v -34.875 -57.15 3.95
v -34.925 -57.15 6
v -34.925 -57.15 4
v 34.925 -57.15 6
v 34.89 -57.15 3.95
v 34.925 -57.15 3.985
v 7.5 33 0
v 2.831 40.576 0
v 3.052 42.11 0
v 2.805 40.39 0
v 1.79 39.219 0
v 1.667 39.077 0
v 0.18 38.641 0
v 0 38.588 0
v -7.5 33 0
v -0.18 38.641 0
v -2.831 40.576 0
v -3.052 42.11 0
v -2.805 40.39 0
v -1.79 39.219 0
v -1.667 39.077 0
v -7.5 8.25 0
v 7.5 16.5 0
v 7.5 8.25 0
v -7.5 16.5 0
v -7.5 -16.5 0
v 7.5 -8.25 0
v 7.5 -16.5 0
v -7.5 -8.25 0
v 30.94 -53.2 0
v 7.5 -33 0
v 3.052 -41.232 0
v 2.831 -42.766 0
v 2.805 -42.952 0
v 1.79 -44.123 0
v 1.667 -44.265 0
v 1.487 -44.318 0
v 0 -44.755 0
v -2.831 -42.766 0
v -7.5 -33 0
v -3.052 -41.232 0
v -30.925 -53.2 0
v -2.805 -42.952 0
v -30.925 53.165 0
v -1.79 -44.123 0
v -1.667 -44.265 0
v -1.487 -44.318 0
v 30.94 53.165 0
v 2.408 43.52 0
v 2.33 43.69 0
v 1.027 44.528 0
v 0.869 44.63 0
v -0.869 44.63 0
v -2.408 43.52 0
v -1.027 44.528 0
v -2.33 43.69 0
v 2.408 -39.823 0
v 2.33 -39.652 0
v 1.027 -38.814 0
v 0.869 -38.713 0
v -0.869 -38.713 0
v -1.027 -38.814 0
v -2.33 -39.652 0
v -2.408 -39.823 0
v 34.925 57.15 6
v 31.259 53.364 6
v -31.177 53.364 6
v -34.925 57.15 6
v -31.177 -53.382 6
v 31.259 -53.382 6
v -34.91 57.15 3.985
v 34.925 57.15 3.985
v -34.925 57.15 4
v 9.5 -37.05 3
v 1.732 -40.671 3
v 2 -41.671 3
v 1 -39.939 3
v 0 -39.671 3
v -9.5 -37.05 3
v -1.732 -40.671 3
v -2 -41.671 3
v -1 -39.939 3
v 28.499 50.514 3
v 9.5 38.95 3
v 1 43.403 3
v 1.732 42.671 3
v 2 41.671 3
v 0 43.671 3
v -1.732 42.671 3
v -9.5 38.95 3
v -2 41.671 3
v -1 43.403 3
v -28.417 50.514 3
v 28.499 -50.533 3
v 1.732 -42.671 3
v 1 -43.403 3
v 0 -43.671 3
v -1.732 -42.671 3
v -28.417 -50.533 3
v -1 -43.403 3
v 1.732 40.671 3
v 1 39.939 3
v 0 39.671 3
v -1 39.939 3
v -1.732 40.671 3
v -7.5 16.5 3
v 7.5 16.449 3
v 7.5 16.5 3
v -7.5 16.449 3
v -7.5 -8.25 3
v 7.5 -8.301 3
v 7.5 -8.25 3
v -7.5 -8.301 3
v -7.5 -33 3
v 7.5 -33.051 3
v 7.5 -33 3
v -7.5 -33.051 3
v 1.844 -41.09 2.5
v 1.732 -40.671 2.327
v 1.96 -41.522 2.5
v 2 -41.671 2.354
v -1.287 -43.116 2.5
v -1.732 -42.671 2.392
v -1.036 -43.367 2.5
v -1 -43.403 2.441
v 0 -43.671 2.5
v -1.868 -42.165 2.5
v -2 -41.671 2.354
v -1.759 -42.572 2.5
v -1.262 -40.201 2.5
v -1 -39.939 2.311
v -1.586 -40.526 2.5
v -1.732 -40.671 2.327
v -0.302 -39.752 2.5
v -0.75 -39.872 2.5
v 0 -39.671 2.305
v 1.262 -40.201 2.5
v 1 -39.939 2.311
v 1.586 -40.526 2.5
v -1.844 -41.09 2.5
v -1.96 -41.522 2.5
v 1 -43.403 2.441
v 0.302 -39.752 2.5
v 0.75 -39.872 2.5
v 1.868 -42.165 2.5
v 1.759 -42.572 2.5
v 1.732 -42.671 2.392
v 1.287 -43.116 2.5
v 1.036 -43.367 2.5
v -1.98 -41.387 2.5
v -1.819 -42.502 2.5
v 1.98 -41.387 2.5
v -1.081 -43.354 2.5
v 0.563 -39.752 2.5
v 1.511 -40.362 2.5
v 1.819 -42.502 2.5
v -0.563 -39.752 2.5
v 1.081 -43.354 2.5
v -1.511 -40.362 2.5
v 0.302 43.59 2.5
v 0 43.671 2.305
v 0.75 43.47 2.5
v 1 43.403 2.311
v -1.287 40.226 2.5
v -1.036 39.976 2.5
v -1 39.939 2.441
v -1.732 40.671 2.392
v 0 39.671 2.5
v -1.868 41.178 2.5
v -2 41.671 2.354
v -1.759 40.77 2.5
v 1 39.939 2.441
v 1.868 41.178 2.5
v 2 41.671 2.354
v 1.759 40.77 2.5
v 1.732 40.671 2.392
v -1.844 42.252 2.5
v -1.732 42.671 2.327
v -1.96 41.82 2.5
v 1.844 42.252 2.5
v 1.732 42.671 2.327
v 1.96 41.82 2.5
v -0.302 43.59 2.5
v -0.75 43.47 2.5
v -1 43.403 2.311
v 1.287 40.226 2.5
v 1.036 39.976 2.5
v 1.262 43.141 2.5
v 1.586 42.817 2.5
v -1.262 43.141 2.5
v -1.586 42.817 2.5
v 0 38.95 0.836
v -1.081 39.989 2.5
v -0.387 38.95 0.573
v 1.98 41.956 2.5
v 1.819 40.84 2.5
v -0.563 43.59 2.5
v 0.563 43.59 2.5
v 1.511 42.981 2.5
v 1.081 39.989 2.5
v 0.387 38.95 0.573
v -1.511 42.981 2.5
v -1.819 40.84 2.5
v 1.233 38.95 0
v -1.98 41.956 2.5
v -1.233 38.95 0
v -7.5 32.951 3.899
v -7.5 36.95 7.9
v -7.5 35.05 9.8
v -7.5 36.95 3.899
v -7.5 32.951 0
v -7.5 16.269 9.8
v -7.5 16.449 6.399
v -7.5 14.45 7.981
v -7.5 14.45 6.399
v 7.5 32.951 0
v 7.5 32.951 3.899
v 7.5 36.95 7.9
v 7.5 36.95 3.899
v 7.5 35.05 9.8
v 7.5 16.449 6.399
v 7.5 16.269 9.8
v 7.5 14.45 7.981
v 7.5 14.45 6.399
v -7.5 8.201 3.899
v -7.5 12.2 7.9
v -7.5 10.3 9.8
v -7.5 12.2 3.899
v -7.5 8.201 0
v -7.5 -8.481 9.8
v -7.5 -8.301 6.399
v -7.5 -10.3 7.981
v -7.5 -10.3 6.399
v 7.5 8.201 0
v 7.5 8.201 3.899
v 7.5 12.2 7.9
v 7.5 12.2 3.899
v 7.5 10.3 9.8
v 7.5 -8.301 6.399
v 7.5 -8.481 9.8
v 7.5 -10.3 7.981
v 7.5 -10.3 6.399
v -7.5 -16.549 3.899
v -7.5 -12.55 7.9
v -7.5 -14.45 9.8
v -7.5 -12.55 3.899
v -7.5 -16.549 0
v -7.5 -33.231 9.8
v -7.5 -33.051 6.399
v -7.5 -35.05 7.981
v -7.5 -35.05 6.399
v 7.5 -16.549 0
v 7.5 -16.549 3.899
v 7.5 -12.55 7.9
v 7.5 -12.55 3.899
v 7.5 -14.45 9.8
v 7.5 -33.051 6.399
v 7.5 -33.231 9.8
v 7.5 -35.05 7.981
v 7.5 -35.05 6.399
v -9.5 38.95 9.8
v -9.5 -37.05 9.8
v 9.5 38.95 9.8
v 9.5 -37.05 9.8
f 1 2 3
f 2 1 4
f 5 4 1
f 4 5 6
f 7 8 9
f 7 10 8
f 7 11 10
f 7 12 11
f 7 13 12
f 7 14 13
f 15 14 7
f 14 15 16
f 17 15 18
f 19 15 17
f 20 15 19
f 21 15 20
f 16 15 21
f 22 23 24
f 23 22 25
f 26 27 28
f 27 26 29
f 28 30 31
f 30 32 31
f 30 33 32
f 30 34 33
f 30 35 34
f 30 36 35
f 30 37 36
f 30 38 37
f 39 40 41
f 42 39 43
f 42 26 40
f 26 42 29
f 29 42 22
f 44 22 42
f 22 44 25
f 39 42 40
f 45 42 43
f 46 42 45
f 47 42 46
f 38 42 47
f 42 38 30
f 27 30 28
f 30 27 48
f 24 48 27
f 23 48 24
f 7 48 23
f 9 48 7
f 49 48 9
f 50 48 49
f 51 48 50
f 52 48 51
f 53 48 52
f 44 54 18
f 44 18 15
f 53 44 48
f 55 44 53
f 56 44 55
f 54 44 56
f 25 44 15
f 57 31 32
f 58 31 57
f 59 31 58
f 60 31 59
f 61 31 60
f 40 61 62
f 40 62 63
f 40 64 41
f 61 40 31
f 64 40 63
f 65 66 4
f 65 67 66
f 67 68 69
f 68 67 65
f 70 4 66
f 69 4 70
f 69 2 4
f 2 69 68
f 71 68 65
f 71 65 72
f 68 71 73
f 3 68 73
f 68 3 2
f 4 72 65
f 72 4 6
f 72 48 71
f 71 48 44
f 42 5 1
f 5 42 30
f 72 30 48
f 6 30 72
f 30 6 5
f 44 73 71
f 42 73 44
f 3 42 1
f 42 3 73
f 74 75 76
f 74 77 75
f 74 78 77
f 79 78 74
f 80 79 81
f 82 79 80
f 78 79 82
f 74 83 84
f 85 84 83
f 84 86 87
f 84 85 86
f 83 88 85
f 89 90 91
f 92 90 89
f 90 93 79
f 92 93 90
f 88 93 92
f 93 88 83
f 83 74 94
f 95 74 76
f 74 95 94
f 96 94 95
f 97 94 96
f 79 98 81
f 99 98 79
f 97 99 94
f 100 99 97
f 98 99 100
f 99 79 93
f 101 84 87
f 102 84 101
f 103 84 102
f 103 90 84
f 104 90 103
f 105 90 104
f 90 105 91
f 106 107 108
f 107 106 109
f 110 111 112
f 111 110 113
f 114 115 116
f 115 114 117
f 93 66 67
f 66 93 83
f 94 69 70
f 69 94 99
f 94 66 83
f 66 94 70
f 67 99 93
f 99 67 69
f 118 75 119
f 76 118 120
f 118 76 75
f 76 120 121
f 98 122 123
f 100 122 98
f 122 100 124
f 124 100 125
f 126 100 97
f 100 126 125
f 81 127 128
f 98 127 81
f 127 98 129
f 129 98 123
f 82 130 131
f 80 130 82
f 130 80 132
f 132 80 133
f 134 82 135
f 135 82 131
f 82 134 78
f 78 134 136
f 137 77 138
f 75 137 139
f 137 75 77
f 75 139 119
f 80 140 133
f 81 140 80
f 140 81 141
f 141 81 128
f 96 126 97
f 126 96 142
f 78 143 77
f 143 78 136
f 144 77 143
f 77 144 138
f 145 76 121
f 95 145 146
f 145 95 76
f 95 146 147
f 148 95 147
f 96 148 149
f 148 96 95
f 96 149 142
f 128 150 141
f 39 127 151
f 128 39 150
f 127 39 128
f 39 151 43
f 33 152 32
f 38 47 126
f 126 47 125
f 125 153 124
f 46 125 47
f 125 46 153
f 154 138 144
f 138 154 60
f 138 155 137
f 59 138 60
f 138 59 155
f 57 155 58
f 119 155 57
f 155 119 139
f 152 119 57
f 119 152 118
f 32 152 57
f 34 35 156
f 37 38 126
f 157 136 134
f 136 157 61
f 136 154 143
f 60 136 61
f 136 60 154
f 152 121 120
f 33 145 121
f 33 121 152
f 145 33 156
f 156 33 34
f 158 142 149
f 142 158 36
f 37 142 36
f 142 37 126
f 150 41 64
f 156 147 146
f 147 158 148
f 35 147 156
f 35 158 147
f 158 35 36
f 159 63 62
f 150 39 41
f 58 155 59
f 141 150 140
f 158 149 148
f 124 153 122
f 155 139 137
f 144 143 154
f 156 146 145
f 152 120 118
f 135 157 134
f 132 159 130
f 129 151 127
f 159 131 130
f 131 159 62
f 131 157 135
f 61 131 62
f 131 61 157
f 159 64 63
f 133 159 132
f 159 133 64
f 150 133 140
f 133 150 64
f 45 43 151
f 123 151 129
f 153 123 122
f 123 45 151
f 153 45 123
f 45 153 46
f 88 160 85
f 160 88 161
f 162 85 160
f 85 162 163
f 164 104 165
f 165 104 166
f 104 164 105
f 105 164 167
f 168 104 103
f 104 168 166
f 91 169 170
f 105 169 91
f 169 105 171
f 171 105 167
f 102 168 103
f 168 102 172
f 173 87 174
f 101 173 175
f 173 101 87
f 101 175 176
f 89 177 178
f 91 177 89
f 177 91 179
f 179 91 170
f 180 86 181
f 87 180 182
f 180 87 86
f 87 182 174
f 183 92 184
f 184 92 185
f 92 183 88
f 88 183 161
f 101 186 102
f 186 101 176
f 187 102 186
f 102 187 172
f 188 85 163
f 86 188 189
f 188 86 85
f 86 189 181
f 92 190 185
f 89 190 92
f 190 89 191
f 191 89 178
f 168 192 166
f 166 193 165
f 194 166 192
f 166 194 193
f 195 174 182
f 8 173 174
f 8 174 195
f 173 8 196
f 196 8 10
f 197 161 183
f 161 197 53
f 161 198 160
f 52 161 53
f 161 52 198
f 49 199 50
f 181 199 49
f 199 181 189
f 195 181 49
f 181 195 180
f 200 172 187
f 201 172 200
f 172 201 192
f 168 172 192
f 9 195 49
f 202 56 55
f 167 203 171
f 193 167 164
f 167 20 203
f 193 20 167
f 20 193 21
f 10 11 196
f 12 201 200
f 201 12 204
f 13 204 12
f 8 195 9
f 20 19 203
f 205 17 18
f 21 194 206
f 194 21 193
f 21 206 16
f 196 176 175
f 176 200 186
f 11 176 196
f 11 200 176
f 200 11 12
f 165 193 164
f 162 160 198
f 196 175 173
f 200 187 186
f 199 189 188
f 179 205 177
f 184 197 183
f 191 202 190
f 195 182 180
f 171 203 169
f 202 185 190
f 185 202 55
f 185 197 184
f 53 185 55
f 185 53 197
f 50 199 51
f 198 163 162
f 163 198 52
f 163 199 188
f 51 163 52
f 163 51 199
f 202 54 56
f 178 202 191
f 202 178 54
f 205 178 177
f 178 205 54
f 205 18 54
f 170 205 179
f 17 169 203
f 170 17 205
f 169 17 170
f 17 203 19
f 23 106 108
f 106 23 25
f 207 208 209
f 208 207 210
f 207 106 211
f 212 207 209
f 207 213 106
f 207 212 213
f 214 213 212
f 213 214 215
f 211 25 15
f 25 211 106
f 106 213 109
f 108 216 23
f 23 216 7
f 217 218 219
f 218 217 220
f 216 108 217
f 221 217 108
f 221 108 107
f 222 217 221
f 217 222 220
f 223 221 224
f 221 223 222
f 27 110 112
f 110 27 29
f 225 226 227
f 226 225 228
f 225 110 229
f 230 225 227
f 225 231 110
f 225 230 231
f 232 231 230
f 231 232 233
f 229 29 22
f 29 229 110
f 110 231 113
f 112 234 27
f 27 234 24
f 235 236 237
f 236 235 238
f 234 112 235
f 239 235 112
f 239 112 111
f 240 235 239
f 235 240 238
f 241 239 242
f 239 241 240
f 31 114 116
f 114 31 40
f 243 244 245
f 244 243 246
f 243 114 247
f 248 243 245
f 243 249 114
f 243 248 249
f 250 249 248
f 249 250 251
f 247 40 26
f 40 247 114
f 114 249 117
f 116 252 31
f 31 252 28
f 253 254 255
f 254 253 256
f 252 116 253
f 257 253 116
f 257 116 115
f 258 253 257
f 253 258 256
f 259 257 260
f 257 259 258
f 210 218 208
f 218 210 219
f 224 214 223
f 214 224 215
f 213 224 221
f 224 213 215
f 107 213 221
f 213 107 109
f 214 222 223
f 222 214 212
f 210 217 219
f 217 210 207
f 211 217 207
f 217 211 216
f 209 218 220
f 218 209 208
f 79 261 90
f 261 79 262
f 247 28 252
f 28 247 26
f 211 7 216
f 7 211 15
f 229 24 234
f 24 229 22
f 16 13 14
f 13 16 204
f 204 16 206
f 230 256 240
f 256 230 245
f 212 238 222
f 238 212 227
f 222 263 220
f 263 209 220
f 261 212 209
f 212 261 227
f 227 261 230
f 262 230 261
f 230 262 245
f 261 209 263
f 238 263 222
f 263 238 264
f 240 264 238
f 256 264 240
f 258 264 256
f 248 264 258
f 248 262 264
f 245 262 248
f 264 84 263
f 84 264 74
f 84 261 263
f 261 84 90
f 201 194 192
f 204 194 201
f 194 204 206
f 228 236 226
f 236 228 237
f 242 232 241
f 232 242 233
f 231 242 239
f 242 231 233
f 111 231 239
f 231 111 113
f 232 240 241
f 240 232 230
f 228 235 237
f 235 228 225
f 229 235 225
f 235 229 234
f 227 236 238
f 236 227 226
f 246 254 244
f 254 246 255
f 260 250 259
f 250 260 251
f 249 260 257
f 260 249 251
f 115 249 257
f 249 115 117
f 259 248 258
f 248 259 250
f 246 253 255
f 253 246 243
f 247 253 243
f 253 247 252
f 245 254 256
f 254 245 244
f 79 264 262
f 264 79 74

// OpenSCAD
// WALLY - Wall Plate Customizer v1.4
// by TheNewHobbyist 2013 (http://thenewhobbyist.com)
// http://www.thingiverse.com/thing:47956
//
// Most of the connectors used with this thing are panel mount connectors from
// www.DataPro.net I can't vouch for their quality but they did have easy to
// find dimensions for their products so I used them.
//
// This could be tightened up considerably but I thought I'd get it out there for people
// to experiment with before I lose my mind staring at it too long. Also this is my
// first OpenSCAD model so cut me some slack ;)
//
//   Notes:
//
// * The plug types "Duplex Outlet", "Long_Toggle Switch", "Toggle Switch", and "Rocker"
//   will all use the entire plate when selected in top or bottom configuration. The
//   other selection (if not "none" will be selected.
//
// * "None" and "Blank should not be considered equal. if "None" is selected for one of
//   the two holes on a plate the other selection will be centered on that plate. If
//   "Blank" is selected that plug location will remain blank but the other selection
//   will NOT move into a centered position.
//
//	Change Log:
//
//	v1.1
//	UPDATED: Screw hole locations for designer and toggle plate types.
//	UPDATED: Hole size for designer plate type.
//	UPDATED: Outlet hole spacing
//
//	v1.2
//	ADDED: Long Toggle Switch for laird
//
//	v1.3
//	ADDED: 3 new sizes for plate export: Standard, Junior-Jumbo, and Jumbo.
//
//	v1.3a
//	ADDED: Keystone jack pair
//
//	v1.3b
//	ADDED: whole-plate 2x3 array of Keystone jacks
//
//  v1.4 by rssalerno
//  ADDED: 1x3 array of Keystone jacks
//  FIXED: bugs in plates 4 and 5

  //////////////////////////
 // Customizer Settings: //
//////////////////////////

//How big are we talkin' here?
plate_width = 1; //	[1:5]

// Bigger hole in your wall? Try this
plate_size = 0; // [0:Standard, 1:Junior-Jumbo, 2:Jumbo]

//Pick a plug or full plate type
1st_plate = "keystone3";  //	["none":None, "blank":Blank Port, "toggle":Full Plate - Toggle Switch, "long_toggle":Full Plate - Long Toggle Switch, "outlet":Full Plate - Duplex Outlet, "rocker":Full Plate - Rocker/Designer Plate, "keystone1":Keystone Jack, "keystone2":Keystone Jack Pair, "keystone3":1x3 Keystone Jack array, "keystone6":2x3 Keystone Jack array, "vga":VGA Port, "hdmi":HDMI Port, "dvi":DVI-I Port, "displayport":Displayport, "cat5e":Cat5e/Cat6 Port, "usb-a":USB-A Port, "usb-b":USB-B Port, "firewire":Firewire IEEE 1394 Port, "db09":DB-09 Port, "ps2":PS2 Port, "f-type": F-Type/Coaxial Port,"svideo":S-Video Port, "stereo":Stereo Headphone Jack]
//Pick a bottom plug type or leave as none
1st_plate_bottom_hole = "none";  //	["none":None, "blank":Blank Port, "keystone1":Keystone Jack, "keystone2":Keystone Jack Pair, "vga":VGA Port, "hdmi":HDMI Port, "dvi":DVI-I Port, "displayport":Displayport, "cat5e":Cat5e/Cat6 Port, "usb-a":USB-A Port, "usb-b":USB-B Port, "firewire":Firewire IEEE 1394 Port, "db09":DB-09 Port, "ps2":PS2 Port, "f-type": F-Type/Coaxial Port,"svideo":S-Video Port, "stereo":Stereo Headphone Jack]
//Pick a plug or full plate type
2nd_plate = "none";  //	["none":None, "blank":Blank Port, "toggle":Full Plate - Toggle Switch, "long_toggle":Full Plate - Long Toggle Switch, "outlet":Full Plate - Duplex Outlet, "rocker":Full Plate - Rocker/Designer Plate, "keystone1":Keystone Jack, "keystone2":Keystone Jack Pair, "keystone3":1x3 Keystone Jack array, "keystone6":2x3 Keystone Jack array, "vga":VGA Port, "hdmi":HDMI Port, "dvi":DVI-I Port, "displayport":Displayport, "cat5e":Cat5e/Cat6 Port, "usb-a":USB-A Port, "usb-b":USB-B Port, "firewire":Firewire IEEE 1394 Port, "db09":DB-09 Port, "ps2":PS2 Port, "f-type": F-Type/Coaxial Port,"svideo":S-Video Port, "stereo":Stereo Headphone Jack]
//Pick a bottom plug type or leave as none
2nd_plate_bottom_hole = "none";  //	["none":None, "blank":Blank Port, "keystone1":Keystone Jack, "keystone2":Keystone Jack Pair, "vga":VGA Port, "hdmi":HDMI Port, "dvi":DVI-I Port, "displayport":Displayport, "cat5e":Cat5e/Cat6 Port, "usb-a":USB-A Port, "usb-b":USB-B Port, "firewire":Firewire IEEE 1394 Port, "db09":DB-09 Port, "ps2":PS2 Port, "f-type": F-Type/Coaxial Port,"svideo":S-Video Port, "stereo":Stereo Headphone Jack]
//Pick a plug or full plate type
3rd_plate = "none";  //	["none":None, "blank":Blank Port, "toggle":Full Plate - Toggle Switch, "long_toggle":Full Plate - Long Toggle Switch, "outlet":Full Plate - Duplex Outlet, "rocker":Full Plate - Rocker/Designer Plate, "keystone1":Keystone Jack, "keystone2":Keystone Jack Pair, "keystone3":1x3 Keystone Jack array, "keystone6":2x3 Keystone Jack array, "vga":VGA Port, "hdmi":HDMI Port, "dvi":DVI-I Port, "displayport":Displayport, "cat5e":Cat5e/Cat6 Port, "usb-a":USB-A Port, "usb-b":USB-B Port, "firewire":Firewire IEEE 1394 Port, "db09":DB-09 Port, "ps2":PS2 Port, "f-type": F-Type/Coaxial Port,"svideo":S-Video Port, "stereo":Stereo Headphone Jack]
//Pick a bottom plug type or leave as none
3rd_plate_bottom_hole = "none";  //	["none":None, "blank":Blank Port, "keystone1":Keystone Jack, "keystone2":Keystone Jack Pair, "vga":VGA Port, "hdmi":HDMI Port, "dvi":DVI-I Port, "displayport":Displayport, "cat5e":Cat5e/Cat6 Port, "usb-a":USB-A Port, "usb-b":USB-B Port, "firewire":Firewire IEEE 1394 Port, "db09":DB-09 Port, "ps2":PS2 Port, "f-type": F-Type/Coaxial Port,"svideo":S-Video Port, "stereo":Stereo Headphone Jack]
//Pick a plug or full plate type
4th_plate = "none";  //["none":None, "blank":Blank Port, "toggle":Full Plate - Toggle Switch, "long_toggle":Full Plate - Long Toggle Switch, "outlet":Full Plate - Duplex Outlet, "rocker":Full Plate - Rocker/Designer Plate, "keystone1":Keystone Jack, "keystone2":Keystone Jack Pair, "keystone3":1x3 Keystone Jack array, "keystone6":2x3 Keystone Jack array, "vga":VGA Port, "hdmi":HDMI Port, "dvi":DVI-I Port, "displayport":Displayport, "cat5e":Cat5e/Cat6 Port, "usb-a":USB-A Port, "usb-b":USB-B Port, "firewire":Firewire IEEE 1394 Port, "db09":DB-09 Port, "ps2":PS2 Port, "f-type": F-Type/Coaxial Port,"svideo":S-Video Port, "stereo":Stereo Headphone Jack]
//Pick a bottom plug type or leave as none
4th_plate_bottom_hole = "none";  //	["none":None, "blank":Blank Port, "keystone1":Keystone Jack, "keystone2":Keystone Jack Pair, "vga":VGA Port, "hdmi":HDMI Port, "dvi":DVI-I Port, "displayport":Displayport, "cat5e":Cat5e/Cat6 Port, "usb-a":USB-A Port, "usb-b":USB-B Port, "firewire":Firewire IEEE 1394 Port, "db09":DB-09 Port, "ps2":PS2 Port, "f-type": F-Type/Coaxial Port,"svideo":S-Video Port, "stereo":Stereo Headphone Jack]
//Pick a plug or full plate type
5th_plate = "none";  //["none":None, "blank":Blank Port, "toggle":Full Plate - Toggle Switch, "long_toggle":Full Plate - Long Toggle Switch, "outlet":Full Plate - Duplex Outlet, "rocker":Full Plate - Rocker/Designer Plate, "keystone1":Keystone Jack, "keystone2":Keystone Jack Pair, "keystone3":1x3 Keystone Jack array, "keystone6":2x3 Keystone Jack array, "vga":VGA Port, "hdmi":HDMI Port, "dvi":DVI-I Port, "displayport":Displayport, "cat5e":Cat5e/Cat6 Port, "usb-a":USB-A Port, "usb-b":USB-B Port, "firewire":Firewire IEEE 1394 Port, "db09":DB-09 Port, "ps2":PS2 Port, "f-type": F-Type/Coaxial Port,"svideo":S-Video Port, "stereo":Stereo Headphone Jack]
//Pick a bottom plug type or leave as none
5th_plate_bottom_hole = "none";  //	["none":None, "blank":Blank Port, "keystone1":Keystone Jack, "keystone2":Keystone Jack Pair, "vga":VGA Port, "hdmi":HDMI Port, "dvi":DVI-I Port, "displayport":Displayport, "cat5e":Cat5e/Cat6 Port, "usb-a":USB-A Port, "usb-b":USB-B Port, "firewire":Firewire IEEE 1394 Port, "db09":DB-09 Port, "ps2":PS2 Port, "f-type": F-Type/Coaxial Port,"svideo":S-Video Port, "stereo":Stereo Headphone Jack]

  //////////////////////
 // Static Settings: //
//////////////////////

module GoAwayCustomizer() {
// This module is here to stop Customizer from picking up the variables below
}

l_offset = [34.925,39.6875,44.45];
r_offset = [34.925,39.6875,44.45];
spacer = [0,0,46.0375,92.075,138.1125,184.15];
solid_plate_width = l_offset[plate_size] + spacer[plate_width] + r_offset[plate_size];

height_sizes = [114.3,123.825,133.35];

height = 114.3; //plate height (static)
gang_width=[0,69.86,115.824,161.925,206.375,254]; // Plate widths (standard)

edgewidth = solid_plate_width + 10; // Bevel setting for top and bottom
rightbevel = solid_plate_width - 4; // Bevel for right side (scales)

left_offset = 34.925; // Offset first hole position
switch_offset = 46.0375; // Offset all additional holes
thinner_offset=[0,0.92,0.95,0.96,0.97,0.973]; // Manual fix for right side wackiness

positions=[height_sizes[plate_size]/2,height_sizes[plate_size]/2 - 14.25,height_sizes[plate_size]/2 + 14.25];

// preview[view:north, tilt:bottom]

  ///////////////////
 // Hole Control: //
///////////////////

module plate1(){
	if (1st_plate == "toggle" || 1st_plate_bottom_hole == "toggle"){
		translate([0,l_offset[plate_size],0]) toggle_screws();
		translate([0,l_offset[plate_size],0]) hole("toggle");
		}
	else if (1st_plate == "long_toggle" || 1st_plate_bottom_hole == "long_toggle"){
		translate([0,l_offset[plate_size],0]) toggle_screws();
		translate([0,l_offset[plate_size],0]) hole("long_toggle");
		}
	else if (1st_plate == "rocker" || 1st_plate_bottom_hole == "rocker"){
		translate([0,l_offset[plate_size],0]) rocker_screws();
		translate([0,l_offset[plate_size],0]) hole("rocker");
		}
	else if (1st_plate == "outlet" || 1st_plate_bottom_hole == "outlet") {
	translate([0,l_offset[plate_size],0]) hole("outlet");
	}
	else if (1st_plate_bottom_hole == "none") {
		translate([0,l_offset[plate_size],0]) box_screws();
		translate([positions[0],l_offset[plate_size],0]) hole(1st_plate);
			}
	else if (1st_plate == "none") {
		translate([0,l_offset[plate_size],0]) box_screws();
		translate([positions[0],l_offset[plate_size],0]) hole(1st_plate_bottom_hole);
			}
	else {
	translate([0,l_offset[plate_size],0]) box_screws();
	translate([positions[1],l_offset[plate_size],0]) hole(1st_plate);
	translate([positions[2],l_offset[plate_size],0]) hole(1st_plate_bottom_hole);
	}
}

module plate2(){
	if (2nd_plate == "toggle" || 2nd_plate_bottom_hole == "toggle"){
		translate([0,l_offset[plate_size] + switch_offset,0]) toggle_screws();
		translate([0,l_offset[plate_size] + switch_offset,0]) hole("toggle");
		}
	else if (2nd_plate == "long_toggle" || 2nd_plate_bottom_hole == "long_toggle"){
		translate([0,l_offset[plate_size] + switch_offset,0]) toggle_screws();
		translate([0,l_offset[plate_size] + switch_offset,0]) hole("long_toggle");
		}
	else if (2nd_plate == "rocker" || 2nd_plate_bottom_hole == "rocker"){
		translate([0,l_offset[plate_size] + switch_offset,0]) rocker_screws();
		translate([0,l_offset[plate_size] + switch_offset,0]) hole("rocker");
		}
	else if (2nd_plate == "outlet" || 2nd_plate_bottom_hole == "outlet") {
	translate([0,l_offset[plate_size] + switch_offset,0]) hole("outlet");
	}
	else if (2nd_plate_bottom_hole == "none") {
		translate([0,l_offset[plate_size] + switch_offset,0]) box_screws();
		translate([positions[0],l_offset[plate_size] + switch_offset,0]) hole(2nd_plate);
			}
	else if (2nd_plate == "none") {
		translate([0,l_offset[plate_size] + switch_offset,0]) box_screws();
		translate([positions[0],l_offset[plate_size] + switch_offset,0]) hole(2nd_plate_bottom_hole);
			}
	else {
	translate([0,l_offset[plate_size] + switch_offset,0]) box_screws();
	translate([positions[1],l_offset[plate_size] + switch_offset,0]) hole(2nd_plate);
	translate([positions[2],l_offset[plate_size] + switch_offset,0]) hole(2nd_plate_bottom_hole);
	}
}

module plate3(){
	if (3rd_plate == "toggle" || 3rd_plate_bottom_hole == "toggle"){
		translate([0,l_offset[plate_size] + switch_offset * 2,0]) toggle_screws();
		translate([0,l_offset[plate_size] + switch_offset * 2,0]) hole("toggle");
		}
	else if (3rd_plate == "long_toggle" || 3rd_plate_bottom_hole == "long_toggle"){
		translate([0,l_offset[plate_size] + switch_offset * 2,0]) toggle_screws();
		translate([0,l_offset[plate_size] + switch_offset * 2,0]) hole("long_toggle");
		}
	else if (3rd_plate == "rocker" || 3rd_plate_bottom_hole == "rocker"){
		translate([0,l_offset[plate_size] + switch_offset * 2,0]) rocker_screws();
		translate([0,l_offset[plate_size] + switch_offset * 2,0]) hole("rocker");
		}
	else if (3rd_plate == "outlet" || 3rd_plate_bottom_hole == "outlet") {
	translate([0,l_offset[plate_size] + switch_offset * 2,0]) hole("outlet");
	}
	else if (3rd_plate_bottom_hole == "none") {
		translate([0,l_offset[plate_size] + switch_offset * 2,0]) box_screws();
		translate([positions[0],l_offset[plate_size] + switch_offset * 2,0]) hole(3rd_plate);
			}
	else if (3rd_plate == "none") {
		translate([0,l_offset[plate_size] + switch_offset * 2,0]) box_screws();
		translate([positions[0],l_offset[plate_size] + switch_offset * 2,0]) hole(3rd_plate_bottom_hole);
			}
	else {
	translate([0,l_offset[plate_size] + switch_offset * 2,0]) box_screws();
	translate([positions[1],l_offset[plate_size] + switch_offset * 2,0]) hole(3rd_plate);
	translate([positions[2],l_offset[plate_size] + switch_offset * 2,0]) hole(3rd_plate_bottom_hole);
	}
}

module plate4(){
	if (4th_plate == "toggle" || 5th_plate_bottom_hole == "toggle"){
		translate([0,l_offset[plate_size] + switch_offset * 3,0]) toggle_screws();
		translate([0,l_offset[plate_size] + switch_offset * 3,0]) hole("toggle");
		}
	else if (4th_plate == "long_toggle" || 5th_plate_bottom_hole == "long_toggle"){
		translate([0,l_offset[plate_size] + switch_offset * 3,0]) toggle_screws();
		translate([0,l_offset[plate_size] + switch_offset * 3,0]) hole("long_toggle");
		}
	else if (4th_plate == "rocker" || 5th_plate_bottom_hole == "rocker"){
		translate([0,l_offset[plate_size] + switch_offset * 3,0]) rocker_screws();
		translate([0,l_offset[plate_size] + switch_offset * 3,0]) hole("rocker");
		}
	else if (4th_plate == "outlet" || 5th_plate_bottom_hole == "outlet") {
	translate([0,l_offset[plate_size] + switch_offset * 3,0]) hole("outlet");
	}
	else if (4th_plate_bottom_hole == "none") {
		translate([0,l_offset[plate_size] + switch_offset * 3,0]) box_screws();
		translate([positions[0],l_offset[plate_size] + switch_offset * 3,0]) hole(4th_plate);
			}
	else if (4th_plate == "none") {
		translate([0,l_offset[plate_size] + switch_offset * 3,0]) box_screws();
		translate([positions[0],l_offset[plate_size] + switch_offset * 3,0]) hole(4th_plate_bottom_hole);
			}
	else {
	translate([0,l_offset[plate_size] + switch_offset * 3,0]) box_screws();
	translate([positions[1],l_offset[plate_size] + switch_offset * 3,0]) hole(4th_plate);
	translate([positions[2],l_offset[plate_size] + switch_offset * 3,0]) hole(4th_plate_bottom_hole);
	}
}

module plate5(){
	if (5th_plate == "toggle" || 5th_plate_bottom_hole == "toggle"){
		translate([0,l_offset[plate_size] + switch_offset * 4,0]) toggle_screws();
		translate([0,l_offset[plate_size] + switch_offset * 4,0]) hole("toggle");
		}
	else if (5th_plate == "long_toggle" || 5th_plate_bottom_hole == "long_toggle"){
		translate([0,l_offset[plate_size] + switch_offset * 4,0]) toggle_screws();
		translate([0,l_offset[plate_size] + switch_offset * 4,0]) hole("long_toggle");
		}
	else if (5th_plate == "rocker" || 5th_plate_bottom_hole == "rocker"){
		translate([0,l_offset[plate_size] + switch_offset * 4,0]) rocker_screws();
		translate([0,l_offset[plate_size] + switch_offset * 4,0]) hole("rocker");
		}
	else if (5th_plate == "outlet" || 5th_plate_bottom_hole == "outlet") {
	translate([0,l_offset[plate_size] + switch_offset * 4,0]) hole("outlet");
	}
	else if (5th_plate_bottom_hole == "none") {
		translate([0,l_offset[plate_size] + switch_offset * 4,0]) box_screws();
		translate([positions[0],l_offset[plate_size] + switch_offset * 4,0]) hole(5th_plate);
			}
	else if (5th_plate == "none") {
		translate([0,l_offset[plate_size] + switch_offset * 4,0]) box_screws();
		translate([positions[0],l_offset[plate_size] + switch_offset * 4,0]) hole(5th_plate_bottom_hole);
			}
	else {
	translate([0,l_offset[plate_size] + switch_offset * 4,0]) box_screws();
	translate([positions[1],l_offset[plate_size] + switch_offset * 4,0]) hole(5th_plate);
	translate([positions[2],l_offset[plate_size] + switch_offset * 4,0]) hole(5th_plate_bottom_hole);
	}
}

  /////////////////
 // SolidWorks: //
/////////////////

module plate1_solid(){
if (1st_plate == "keystone1" && 1st_plate_bottom_hole == "none") {
	translate([height_sizes[plate_size]/2 + 14.3,l_offset[plate_size] - 11.5,-3.9]) hole("keystone_solid");
	}
else if (1st_plate == "keystone1" && 1st_plate_bottom_hole != "outlet" && 1st_plate_bottom_hole != "toggle" && 1st_plate_bottom_hole != "rocker") {
	translate([height_sizes[plate_size]/2,l_offset[plate_size] - 11.5,-3.9]) hole("keystone_solid");
	}
else if (1st_plate == "keystone2" && 1st_plate_bottom_hole == "none") {
	translate([height_sizes[plate_size]/2 + 14.3,l_offset[plate_size] - 11.5,-3.9]) hole("keystone2_solid");
	}
else if (1st_plate == "keystone2" && 1st_plate_bottom_hole != "outlet" && 1st_plate_bottom_hole != "toggle" && 1st_plate_bottom_hole != "rocker") {
	translate([height_sizes[plate_size]/2,l_offset[plate_size] - 11.5,-3.9]) hole("keystone2_solid");
	}
else if (1st_plate == "keystone3" && 1st_plate_bottom_hole == "none") {
	translate([height_sizes[plate_size]/2 + 14.3,l_offset[plate_size] - 11.5,-3.9]) hole("keystone3_solid");
	}
else if (1st_plate == "keystone6" && 1st_plate_bottom_hole == "none") {
	translate([height_sizes[plate_size]/2 + 14.3,l_offset[plate_size] - 11.5,-3.9]) hole("keystone6_solid");
	}
if (1st_plate_bottom_hole == "keystone1" && 1st_plate == "none") {
	translate([height_sizes[plate_size]/2 + 14.3,l_offset[plate_size] - 11.5,-3.9]) hole("keystone_solid");
	}
if (1st_plate_bottom_hole == "keystone2" && 1st_plate == "none") {
	translate([height_sizes[plate_size]/2 + 14.3,l_offset[plate_size] - 11.5,-3.9]) hole("keystone2_solid");
	}
else if (1st_plate_bottom_hole == "keystone1" && 1st_plate != "outlet" && 1st_plate != "toggle" && 1st_plate != "rocker") {
	translate([height_sizes[plate_size]/2 + 28.5,l_offset[plate_size] - 11.5,-3.9]) hole("keystone_solid");
	}
else if (1st_plate_bottom_hole == "keystone2" && 1st_plate != "outlet" && 1st_plate != "toggle" && 1st_plate != "rocker") {
	translate([height_sizes[plate_size]/2 + 28.5,l_offset[plate_size] - 11.5,-3.9]) hole("keystone2_solid");
	}
}

module plate2_solid(){
if (2nd_plate == "keystone1" && 2nd_plate_bottom_hole == "none") {
	translate([height_sizes[plate_size]/2 + 14.3,l_offset[plate_size] - 11.5 + switch_offset,-3.9]) hole("keystone_solid");
	}
else if (2nd_plate == "keystone1" && 2nd_plate_bottom_hole != "outlet" && 2nd_plate_bottom_hole != "toggle" && 2nd_plate_bottom_hole != "rocker") {
	translate([height_sizes[plate_size]/2,l_offset[plate_size] - 11.5 + switch_offset,-3.9]) hole("keystone_solid");
	}
else if (2nd_plate == "keystone2" && 2nd_plate_bottom_hole == "none") {
	translate([height_sizes[plate_size]/2 + 14.3,l_offset[plate_size] - 11.5 + switch_offset,-3.9]) hole("keystone2_solid");
	}
else if (2nd_plate == "keystone2" && 2nd_plate_bottom_hole != "outlet" && 2nd_plate_bottom_hole != "toggle" && 2nd_plate_bottom_hole != "rocker") {
	translate([height_sizes[plate_size]/2,l_offset[plate_size] - 11.5 + switch_offset,-3.9]) hole("keystone2_solid");
	}
else if (2nd_plate == "keystone3" && 2nd_plate_bottom_hole == "none") {
	translate([height_sizes[plate_size]/2 + 14.3,l_offset[plate_size] - 11.5 + switch_offset,-3.9]) hole("keystone3_solid");
	}
else if (2nd_plate == "keystone6" && 2nd_plate_bottom_hole == "none") {
	translate([height_sizes[plate_size]/2 + 14.3,l_offset[plate_size] - 11.5 + switch_offset,-3.9]) hole("keystone6_solid");
	}
if (2nd_plate_bottom_hole == "keystone1" && 2nd_plate == "none") {
	translate([height_sizes[plate_size]/2 + 14.3,l_offset[plate_size] - 11.5 + switch_offset,-3.9]) hole("keystone_solid");
	}
if (2nd_plate_bottom_hole == "keystone2" && 2nd_plate == "none") {
	translate([height_sizes[plate_size]/2 + 14.3,l_offset[plate_size] - 11.5 + switch_offset,-3.9]) hole("keystone2_solid");
	}
else if (2nd_plate_bottom_hole == "keystone1" && 2nd_plate != "outlet" && 2nd_plate != "toggle" && 2nd_plate != "rocker") {
	translate([height_sizes[plate_size]/2 + 28.5,l_offset[plate_size] - 11.5 + switch_offset,-3.9]) hole("keystone_solid");
	}
else if (2nd_plate_bottom_hole == "keystone2" && 2nd_plate != "outlet" && 2nd_plate != "toggle" && 2nd_plate != "rocker") {
	translate([height_sizes[plate_size]/2 + 28.5,l_offset[plate_size] - 11.5 + switch_offset,-3.9]) hole("keystone2_solid");
	}
}

module plate3_solid(){
if (3rd_plate == "keystone1" && 3rd_plate_bottom_hole == "none") {
	translate([height_sizes[plate_size]/2 + 14.3,l_offset[plate_size] - 11.5 + switch_offset * 2,-3.9]) hole("keystone_solid");
	}
else if (3rd_plate == "keystone1" && 3rd_plate_bottom_hole != "outlet" && 3rd_plate_bottom_hole != "toggle" && 3rd_plate_bottom_hole != "rocker") {
	translate([height_sizes[plate_size]/2,l_offset[plate_size] - 11.5 + switch_offset * 2,-3.9]) hole("keystone_solid");
	}
else if (3rd_plate == "keystone2" && 3rd_plate_bottom_hole == "none") {
	translate([height_sizes[plate_size]/2 + 14.3,l_offset[plate_size] - 11.5 + switch_offset * 2,-3.9]) hole("keystone2_solid");
	}
else if (3rd_plate == "keystone2" && 3rd_plate_bottom_hole != "outlet" && 3rd_plate_bottom_hole != "toggle" && 3rd_plate_bottom_hole != "rocker") {
	translate([height_sizes[plate_size]/2,l_offset[plate_size] - 11.5 + switch_offset * 2,-3.9]) hole("keystone2_solid");
	}
else if (3rd_plate == "keystone3" && 3rd_plate_bottom_hole == "none") {
	translate([height_sizes[plate_size]/2 + 14.3,l_offset[plate_size] - 11.5 + switch_offset * 2,-3.9]) hole("keystone3_solid");
	}
else if (3rd_plate == "keystone6" && 3rd_plate_bottom_hole == "none") {
	translate([height_sizes[plate_size]/2 + 14.3,l_offset[plate_size] - 11.5 + switch_offset * 2,-3.9]) hole("keystone6_solid");
	}
if (3rd_plate_bottom_hole == "keystone1" && 3rd_plate == "none") {
	translate([height_sizes[plate_size]/2 + 14.3,l_offset[plate_size] - 11.5 + switch_offset * 2,-3.9]) hole("keystone_solid");
	}
if (3rd_plate_bottom_hole == "keystone2" && 3rd_plate == "none") {
	translate([height_sizes[plate_size]/2 + 14.3,l_offset[plate_size] - 11.5 + switch_offset * 2,-3.9]) hole("keystone2_solid");
	}
else if (3rd_plate_bottom_hole == "keystone1" && 3rd_plate != "outlet" && 3rd_plate != "toggle" && 3rd_plate != "rocker") {
	translate([height_sizes[plate_size]/2 + 28.5,l_offset[plate_size] - 11.5 + switch_offset * 2,-3.9]) hole("keystone_solid");
	}
else if (3rd_plate_bottom_hole == "keystone2" && 3rd_plate != "outlet" && 3rd_plate != "toggle" && 3rd_plate != "rocker") {
	translate([height_sizes[plate_size]/2 + 28.5,l_offset[plate_size] - 11.5 + switch_offset * 2,-3.9]) hole("keystone2_solid");
	}
}

module plate4_solid(){
if (4th_plate == "keystone1" && 4th_plate_bottom_hole == "none") {
	translate([height_sizes[plate_size]/2 + 14.3,l_offset[plate_size] - 11.5 + switch_offset * 3,-3.9]) hole("keystone_solid");
	}
else if (4th_plate == "keystone1" && 4th_plate_bottom_hole != "outlet" && 4th_plate_bottom_hole != "toggle" && 4th_plate_bottom_hole != "rocker") {
	translate([height_sizes[plate_size]/2,l_offset[plate_size] - 11.5 + switch_offset * 3,-3.9]) hole("keystone_solid");
	}
else if (4th_plate == "keystone2" && 4th_plate_bottom_hole == "none") {
	translate([height_sizes[plate_size]/2 + 14.3,l_offset[plate_size] - 11.5 + switch_offset * 3,-3.9]) hole("keystone2_solid");
	}
else if (4th_plate == "keystone2" && 4th_plate_bottom_hole != "outlet" && 4th_plate_bottom_hole != "toggle" && 5th_plate_bottom_hole != "rocker") {
	translate([height_sizes[plate_size]/2,l_offset[plate_size] - 11.5 + switch_offset * 3,-3.9]) hole("keystone2_solid");
	}
else if (4th_plate == "keystone3" && 4th_plate_bottom_hole == "none") {
	translate([height_sizes[plate_size]/2 + 14.3,l_offset[plate_size] - 11.5 + switch_offset * 3,-3.9]) hole("keystone3_solid");
	}
else if (4th_plate == "keystone6" && 4th_plate_bottom_hole == "none") {
	translate([height_sizes[plate_size]/2 + 14.3,l_offset[plate_size] - 11.5 + switch_offset * 3,-3.9]) hole("keystone6_solid");
	}
if (4th_plate_bottom_hole == "keystone1" && 4th_plate == "none") {
	translate([height_sizes[plate_size]/2 + 14.3,l_offset[plate_size] - 11.5 + switch_offset * 3,-3.9]) hole("keystone_solid");
	}
if (4th_plate_bottom_hole == "keystone2" && 4th_plate == "none") {
	translate([height_sizes[plate_size]/2 + 14.3,l_offset[plate_size] - 11.5 + switch_offset * 3,-3.9]) hole("keystone2_solid");
	}
else if (4th_plate_bottom_hole == "keystone1" && 4th_plate != "outlet" && 4th_plate != "toggle" && 4th_plate != "rocker") {
	translate([height_sizes[plate_size]/2 + 28.5,l_offset[plate_size] - 11.5 + switch_offset * 3,-3.9]) hole("keystone_solid");
	}
else if (4th_plate_bottom_hole == "keystone2" && 4th_plate != "outlet" && 4th_plate != "toggle" && 4th_plate != "rocker") {
	translate([height_sizes[plate_size]/2 + 28.5,l_offset[plate_size] - 11.5 + switch_offset * 3,-3.9]) hole("keystone2_solid");
	}
}

module plate5_solid(){
if (5th_plate == "keystone1" && 5th_plate_bottom_hole == "none") {
	translate([height_sizes[plate_size]/2 + 14.3,l_offset[plate_size] - 11.5 + switch_offset * 4,-3.9]) hole("keystone_solid");
	}
else if (5th_plate == "keystone1" && 5th_plate_bottom_hole != "outlet" && 5th_plate_bottom_hole != "toggle" && 5th_plate_bottom_hole != "rocker") {
	translate([height_sizes[plate_size]/2,l_offset[plate_size] - 11.5 + switch_offset * 4,-3.9]) hole("keystone_solid");
	}
else if (5th_plate == "keystone2" && 5th_plate_bottom_hole == "none") {
	translate([height_sizes[plate_size]/2 + 14.3,l_offset[plate_size] - 11.5 + switch_offset * 4,-3.9]) hole("keystone2_solid");
	}
else if (5th_plate == "keystone2" && 5th_plate_bottom_hole != "outlet" && 5th_plate_bottom_hole != "toggle" && 5th_plate_bottom_hole != "rocker") {
	translate([height_sizes[plate_size]/2,l_offset[plate_size] - 11.5 + switch_offset * 4,-3.9]) hole("keystone2_solid");
	}
else if (5th_plate == "keystone3" && 5th_plate_bottom_hole == "none") {
	translate([height_sizes[plate_size]/2 + 14.3,l_offset[plate_size] - 11.5 + switch_offset * 4,-3.9]) hole("keystone3_solid");
	}
else if (5th_plate == "keystone6" && 5th_plate_bottom_hole == "none") {
	translate([height_sizes[plate_size]/2 + 14.3,l_offset[plate_size] - 11.5 + switch_offset * 4,-3.9]) hole("keystone6_solid");
	}
if (5th_plate_bottom_hole == "keystone1" && 5th_plate == "none") {
	translate([height_sizes[plate_size]/2 + 14.3,l_offset[plate_size] - 11.5 + switch_offset * 4,-3.9]) hole("keystone_solid");
	}
if (5th_plate_bottom_hole == "keystone2" && 5th_plate == "none") {
	translate([height_sizes[plate_size]/2 + 14.3,l_offset[plate_size] - 11.5 + switch_offset * 4,-3.9]) hole("keystone2_solid");
	}
else if (5th_plate_bottom_hole == "keystone1" && 5th_plate != "outlet" && 5th_plate != "toggle" && 5th_plate != "rocker") {
	translate([height_sizes[plate_size]/2 + 28.5,l_offset[plate_size] - 11.5 + switch_offset * 4,-3.9]) hole("keystone_solid");
	}
else if (5th_plate_bottom_hole == "keystone2" && 5th_plate != "outlet" && 5th_plate != "toggle" && 5th_plate != "rocker") {
	translate([height_sizes[plate_size]/2 + 28.5,l_offset[plate_size] - 11.5 + switch_offset * 4,-3.9]) hole("keystone2_solid");
	}
}


  ///////////////////
 // PlateStation: //
///////////////////

//Plate size and bevel
module plate() {
	difference() {
		cube([height_sizes[plate_size],solid_plate_width,6]);
		translate([-4.3,-5,6.2]) rotate([0,45,0]) cube([6,edgewidth,6]); //Top Bevel
		translate([height_sizes[plate_size]-4.2,-5,6.25]) rotate([0,45,0]) cube([6,edgewidth,6]); //Bottom Bevel
		translate([height_sizes[plate_size]+10,-4.4,6.1]) rotate([0,45,90]) cube([6,height_sizes[plate_size]+20,6]); //Left Bevel (doesn't change)
		translate([height_sizes[plate_size]+10,rightbevel,6]) rotate([0,45,90]) cube([6,height_sizes[plate_size]+10,6]); //Right Bevel (scales right)
				}
			}


// Thinning Plate
module plate_inner() {
	scale([0.95,thinner_offset[plate_width],1]){
	translate([3,3,0]){
	difference() {
		cube([height_sizes[plate_size],solid_plate_width,6]);
		translate([-4.3,-5,6.2]) rotate([0,45,0]) cube([6,edgewidth,6]); //Top Bevel
		translate([height_sizes[plate_size]-4.2,-5,6.25]) rotate([0,45,0]) cube([6,edgewidth,6]); //Bottom Bevel
		translate([height_sizes[plate_size]+10,-4.4,6.1]) rotate([0,45,90]) cube([6,height_sizes[plate_size]+20,6]); //Left Bevel (doesn't change)
		translate([height_sizes[plate_size]+10,rightbevel,6]) rotate([0,45,90]) cube([6,height_sizes[plate_size]+10,6]); //Right Bevel (scales right)
				}
			}
		}
	}

// Box screw holes
module box_screws(){
	 translate([height_sizes[plate_size]/2 + 41.67125,0,-1]) cylinder(r=2, h=10, $fn=12);
	 translate([height_sizes[plate_size]/2 + 41.67125,0,3.5]) cylinder(r1=2, r2=3.3, h=3);
	 translate([height_sizes[plate_size]/2 - 41.67125,0,-1]) cylinder(r=2, h=10, $fn=12);
	 translate([height_sizes[plate_size]/2 - 41.67125,0,3.5]) cylinder(r1=2, r2=3.3, h=3);
}

// Rocker/Designer screw holes
module rocker_screws(){
	 translate([height_sizes[plate_size]/2 + 48.41875,0,-1]) cylinder(r=2, h=10, $fn=12);
	 translate([height_sizes[plate_size]/2 + 48.41875,0,3.5]) cylinder(r1=2, r2=3.3, h=3);
	 translate([height_sizes[plate_size]/2 - 48.41875,0,-1]) cylinder(r=2, h=10, $fn=12);
	 translate([height_sizes[plate_size]/2 - 48.41875,0,3.5]) cylinder(r1=2, r2=3.3, h=3);
}

// Toggle screw holes
module toggle_screws(){
	 translate([height_sizes[plate_size]/2 + 30.1625,0,-1]) cylinder(r=2, h=10, $fn=12);
	 translate([height_sizes[plate_size]/2 + 30.1625,0,3.5]) cylinder(r1=2, r2=3.3, h=3);
	 translate([height_sizes[plate_size]/2 - 30.1625,0,-1]) cylinder(r=2, h=10, $fn=12);
	 translate([height_sizes[plate_size]/2 - 30.1625,0,3.5]) cylinder(r1=2, r2=3.3, h=3);
}

  ///////////////
 // Portland: //
///////////////

// Hole Cutout definitions
module hole(hole_type) {


// Toggle switch hole
	if (hole_type == "toggle") {
		translate([height_sizes[plate_size]/2,0,0]) cube([23.8125,10.3188,15], center = true);
		 						}

// Toggle switch hole and screw holes
	if (hole_type == "long_toggle") {
		translate([height_sizes[plate_size]/2,0,0]) cube([43.6563,11.9063,15], center = true);
		 						}

// Rocker switch plate
	if (hole_type == "rocker") {
		translate([height_sizes[plate_size]/2,0,0]) cube([67.1,33.3,15], center = true);

		 						}

// Duplex power outlet plate or dual side toggles
	if (hole_type == "outlet" || hole_type == "dualsidetoggle") {
		translate([height_sizes[plate_size]/2 + 19.3915,0,0]) {
			difference() {
				cylinder(r=17.4625, h=15, center = true);
				translate([-24.2875,-15,-2]) cube([10,37,15], center = false);
				translate([14.2875,-15,-2]) cube([10,37,15], center = false);
								}
							}
		translate([height_sizes[plate_size]/2 - 19.3915,0,0]){
			difference(){
				cylinder(r=17.4625, h=15, center = true);
				translate([-24.2875,-15,-2]) cube([10,37,15], center = false);
				translate([14.2875,-15,-2]) cube([10,37,15], center = false);
								}
							}
		translate([height_sizes[plate_size]/2,0,-1]) cylinder(r=2, h=10);
		translate([height_sizes[plate_size]/2,0,3.5]) cylinder(r1=2, r2=3.3, h=3);
							}

// Blank plate
	if (hole_type == "blank") { }

// VGA & DB09 plate
// VGA Fits http://www.datapro.net/products/vga-dual-panel-mount-f-f-cable.html
// DB09 Fits http://www.datapro.net/products/db9-serial-panel-mount-male-extension.html
	if (hole_type == "vga" || hole_type == "db09") {

			translate([0,-12.5,3]) cylinder(r=1.75, h=10, center = true);
			translate([0,12.5,3]) cylinder(r=1.75, h=10, center = true);
				difference(){
					cube([10,19,13], center=true);
					translate([-5,-9.2,1]) rotate([0,0,-35.6]) cube([4.4,2.4,15], center=true);
					translate([.9,-11.2,0]) rotate([0,0,9.6]) cube([10,4.8,15], center=true);
					translate([4.6,-8.5,0]) rotate([0,0,37.2]) cube([4.4,2.4,15], center=true);
					translate([-5,9.2,1]) rotate([0,0,35.6]) cube([4.4,2.4,15], center=true);
					translate([0.9,11.2,0]) rotate([0,0,-9.6]) cube([10,4.8,15], center=true);
					translate([4.6,8.5,0]) rotate([0,0,-37.2]) cube([4.4,2.4,15], center=true);
								}
						}

// HDMI plate
// Fits http://www.datapro.net/products/hdmi-panel-mount-extension-cable.html
	if (hole_type == "hdmi") {
		translate([0,-13,3]) cylinder(r=1.75, h=10, center = true);
		translate([0,13,3]) cylinder(r=1.75, h=10, center = true);
		translate([0,0,3]) cube([6,16,10], center=true);
							}

// DVI-I plate
// Fits http://www.datapro.net/products/dvi-i-panel-mount-extension-cable.html
	if (hole_type == "dvi") {
		translate([0,-16,3]) cylinder(r=1.75, h=10, center = true);
		translate([0,16,3]) cylinder(r=1.75, h=10, center = true);
		translate([0,0,3]) cube([10,26,10], center=true);
							}

// DisplayPort plate
// Fits http://www.datapro.net/products/dvi-i-panel-mount-extension-cable.html
	if (hole_type == "displayport") {
		translate([0,-13.5,3]) cylinder(r=1.75, h=10, center = true);
		translate([0,13.5,3]) cylinder(r=1.75, h=10, center = true);
		translate([0,0,0]){
			difference(){
				translate([0,0,3]) cube([7,19,10], center=true);
				translate([2.47,-9.37,3]) rotate([0,0,-54.6]) cube([3,5,14], center=true);
						}
								}
									}

// USB-A Plate
// Fits http://www.datapro.net/products/usb-panel-mount-type-a-cable.html
	if (hole_type == "usb-a") {
		translate([0,-15,3]) cylinder(r=1.75, h=10, center = true);
		translate([0,15,3]) cylinder(r=1.75, h=10, center = true);
		translate([0,0,3]) cube([8,16,10], center=true);
							}

// USB-B Plate
// Fits http://www.datapro.net/products/usb-panel-mount-type-b-cable.html
	if (hole_type == "usb-b") {
		translate([0,-13,3]) cylinder(r=1.75, h=10, center = true);
		translate([0,13,3]) cylinder(r=1.75, h=10, center = true);
		translate([0,0,3]) cube([11,12,10], center=true);
							}

// 1394 Firewire Plate
// Fits http://www.datapro.net/products/firewire-panel-mount-extension.html
	if (hole_type == "firewire") {
		translate([0,-13.5,3]) cylinder(r=1.75, h=10, center = true);
		translate([0,13.5,3]) cylinder(r=1.75, h=10, center = true);
		translate([0,0,3]) cube([7,12,10], center=true);
							}

// F-Type / Cable TV Plate
// Fits http://www.datapro.net/products/f-type-panel-mounting-coupler.html
	if (hole_type == "f-type") {
		translate([0,0,3]) cylinder(r=4.7625, h=10, center=true);
							}

// Cat5e & Cat6 plate
// Cat5e Fits http://www.datapro.net/products/cat-5e-panel-mount-ethernet.html
// Cat6 Fits hhttp://www.datapro.net/products/cat-6-panel-mount-ethernet.html
	if (hole_type == "cat5e" || hole_type == "cat6") {
		translate([0,-12.5,3]) cylinder(r=1.75, h=10, center = true);
		translate([0,12.5,3]) cylinder(r=1.75, h=10, center = true);
		translate([0,0,3]) cube([15,15,10], center=true);
		}

// S-Video & PS2 plate
// S-Video Fits hhttp://www.datapro.net/products/cat-6-panel-mount-ethernet.html
// PS2 http://www.datapro.net/products/ps2-panel-mount-extension-cable.html
	if (hole_type == "svideo" || hole_type == "ps2") {
		translate([0,-10,3]) cylinder(r=1.75, h=10, center = true);
		translate([0,10,3]) cylinder(r=1.75, h=10, center = true);
		translate([0,0,3]) cylinder(r=5, h=10, center=true);
		}


// Stereo / 1/4" headphone jack coupler
// Stereo coupler Fits http://www.datapro.net/products/stereo-panel-mount-coupler.html
	if (hole_type == "stereo") {
		translate([0,0,3]) cylinder(r=2.985, h=10, center=true);
		}

//Keystone6 hole
//Hole for a 2x3 array of keystone jacks
	if (hole_type == "keystone6")
	{
          for(i=[-24.75,0,24.75])
          {
            translate([i,0,0])
            {
		translate([0,-15,5]) cube([16.5,15,10], center = true);
		translate([0,15,5]) cube([16.5,15,10], center = true);
            }
          }
	}
  
//Keystone3 hole
//Hole for a 1x3 array of keystone jacks
	if (hole_type == "keystone3")
	{
          for(i=[-24.75,0,24.75])
          {
            translate([i,0,0])
            {
		translate([0,0,5]) cube([16.5,15,10], center = true);
            }
          }
	}
      
    
//Keystone2 hole
//Hole for a side-by-side Keystone Jack pair
  if (hole_type == "keystone2") {
    translate([0,-12,5]) cube([16.5,15,10], center = true);
    translate([0,12,5]) cube([16.5,15,10], center = true);
  }


  //Keystone6_solid hole
  if (hole_type == "keystone6_solid")
  {
    for(i=[-24.75,0,24.75])
    {
      translate([i,0,0])
      {
        translate([0,-15,0]) keystone_frame();
        translate([0,15,0]) keystone_frame();
      }
    }
  }
  
//Keystone3_solid hole - three keystones down the middle
  if (hole_type == "keystone3_solid")
  {
    for(i=[-24.75,0,24.75])
    {
      translate([i,0,0])
      {
        translate([0,0,0]) keystone_frame();
      }
    }
  }
        
//Keystone2_solid hole
//Hole for a side-by-side Keystone Jack frame pair
  if (hole_type == "keystone2_solid") {
    translate([0,-12,0]) keystone_frame();
    translate([0,12,0]) keystone_frame();
  }
       
//Keystone1 hole
//Hole for 1 Keystone Jack
	if (hole_type == "keystone1") {
		translate([0,0,5]) cube([16.5,15,10], center = true);
	}

//Keystone Solid
	if (hole_type == "keystone_solid") {
		rotate([0,0,90]) {
			difference(){
				translate([0,0,.1]) cube([23,30.5,9.8]);
					translate([4,4,0]){
						difference(){
							cube([15,22.5,10]);
							translate([-1,-0.001,3.501]) cube([17,2,6.5]);
							translate([-1,2.5,-3.40970]) rotate([45,0,0]) cube([17,2,6.5]);
							translate([-1,18.501,6.001]) cube([17,4,4]);
							translate([-1,20.5,0]) rotate([-45,0,0]) cube([17,2,6.5]);
						}
					}
				}
			}
		}

//End of module "hole"
}

module keystone_frame()
{
//Keystone Solid
  rotate([0,0,90])
  {
    difference()
    {
      translate([02,02,.1]) cube([19,26.5,9.8]);
      translate([4,4,0])
      {
        difference()
        {
          cube([15,22.5,10]);
          translate([-1,-0.001,3.501]) cube([17,2,6.5]);
          translate([-1,2.5,-3.40970]) rotate([45,0,0]) cube([17,2,6.5]);
          translate([-1,18.501,6.001]) cube([17,4,4]);
          translate([-1,20.5,0]) rotate([-45,0,0]) cube([17,2,6.5]);
        }
      }
    }
  }
}

module keystone_frame1()
{
//Keystone Solid
  rotate([0,0,90])
  {
    difference()
    {
      translate([0,0,.1]) cube([23,30.5,9.8]);
      translate([4,4,0])
      {
        difference()
        {
          cube([15,22.5,10]);
          translate([-1,-0.001,3.501]) cube([17,2,6.5]);
          translate([-1,2.5,-3.40970]) rotate([45,0,0]) cube([17,2,6.5]);
          translate([-1,18.501,6.001]) cube([17,4,4]);
          translate([-1,20.5,0]) rotate([-45,0,0]) cube([17,2,6.5]);
        }
      }
    }
  }
}

  ////////////////////////
 // Number One ENGAGE: //
////////////////////////

// Rotate so it sits correctly on plate (whoops) and make upside down
rotate([0,180,90]){
// put plate at 0,0,0 for easier printing
translate([-height_sizes[plate_size]/2,-solid_plate_width/2,-6]){

if (plate_width == 1) {
	difference() {
		plate();
		translate([0,0,-3]) plate_inner();
		plate1();
			}
		union() {
		plate1_solid();
		}
			}

else if (plate_width == 2) {
difference()
{
plate();
translate([0,0,-3]) plate_inner();
plate1();
plate2();
}
union() {
		plate1_solid();
		plate2_solid();
		}
}

else if (plate_width == 3) {
difference()
{
plate();
translate([0,0,-3]) plate_inner();
plate1();
plate2();
plate3();
}
union() {
		plate1_solid();
		plate2_solid();
		plate3_solid();
		}
}

else if (plate_width == 4) {
difference()
{
plate();
translate([0,0,-3]) plate_inner();
plate1();
plate2();
plate3();
plate4();
}
union() {
		plate1_solid();
		plate2_solid();
		plate3_solid();
		plate4_solid();
		}
}

else if (plate_width == 5) {
difference()
{
plate();
translate([0,0,-3]) plate_inner();
plate1();
plate2();
plate3();
plate4();
plate5();
}
union() {
		plate1_solid();
		plate2_solid();
		plate3_solid();
		plate4_solid();
		plate5_solid();
		}
}

//End Rotate
}
//End Translate
}
